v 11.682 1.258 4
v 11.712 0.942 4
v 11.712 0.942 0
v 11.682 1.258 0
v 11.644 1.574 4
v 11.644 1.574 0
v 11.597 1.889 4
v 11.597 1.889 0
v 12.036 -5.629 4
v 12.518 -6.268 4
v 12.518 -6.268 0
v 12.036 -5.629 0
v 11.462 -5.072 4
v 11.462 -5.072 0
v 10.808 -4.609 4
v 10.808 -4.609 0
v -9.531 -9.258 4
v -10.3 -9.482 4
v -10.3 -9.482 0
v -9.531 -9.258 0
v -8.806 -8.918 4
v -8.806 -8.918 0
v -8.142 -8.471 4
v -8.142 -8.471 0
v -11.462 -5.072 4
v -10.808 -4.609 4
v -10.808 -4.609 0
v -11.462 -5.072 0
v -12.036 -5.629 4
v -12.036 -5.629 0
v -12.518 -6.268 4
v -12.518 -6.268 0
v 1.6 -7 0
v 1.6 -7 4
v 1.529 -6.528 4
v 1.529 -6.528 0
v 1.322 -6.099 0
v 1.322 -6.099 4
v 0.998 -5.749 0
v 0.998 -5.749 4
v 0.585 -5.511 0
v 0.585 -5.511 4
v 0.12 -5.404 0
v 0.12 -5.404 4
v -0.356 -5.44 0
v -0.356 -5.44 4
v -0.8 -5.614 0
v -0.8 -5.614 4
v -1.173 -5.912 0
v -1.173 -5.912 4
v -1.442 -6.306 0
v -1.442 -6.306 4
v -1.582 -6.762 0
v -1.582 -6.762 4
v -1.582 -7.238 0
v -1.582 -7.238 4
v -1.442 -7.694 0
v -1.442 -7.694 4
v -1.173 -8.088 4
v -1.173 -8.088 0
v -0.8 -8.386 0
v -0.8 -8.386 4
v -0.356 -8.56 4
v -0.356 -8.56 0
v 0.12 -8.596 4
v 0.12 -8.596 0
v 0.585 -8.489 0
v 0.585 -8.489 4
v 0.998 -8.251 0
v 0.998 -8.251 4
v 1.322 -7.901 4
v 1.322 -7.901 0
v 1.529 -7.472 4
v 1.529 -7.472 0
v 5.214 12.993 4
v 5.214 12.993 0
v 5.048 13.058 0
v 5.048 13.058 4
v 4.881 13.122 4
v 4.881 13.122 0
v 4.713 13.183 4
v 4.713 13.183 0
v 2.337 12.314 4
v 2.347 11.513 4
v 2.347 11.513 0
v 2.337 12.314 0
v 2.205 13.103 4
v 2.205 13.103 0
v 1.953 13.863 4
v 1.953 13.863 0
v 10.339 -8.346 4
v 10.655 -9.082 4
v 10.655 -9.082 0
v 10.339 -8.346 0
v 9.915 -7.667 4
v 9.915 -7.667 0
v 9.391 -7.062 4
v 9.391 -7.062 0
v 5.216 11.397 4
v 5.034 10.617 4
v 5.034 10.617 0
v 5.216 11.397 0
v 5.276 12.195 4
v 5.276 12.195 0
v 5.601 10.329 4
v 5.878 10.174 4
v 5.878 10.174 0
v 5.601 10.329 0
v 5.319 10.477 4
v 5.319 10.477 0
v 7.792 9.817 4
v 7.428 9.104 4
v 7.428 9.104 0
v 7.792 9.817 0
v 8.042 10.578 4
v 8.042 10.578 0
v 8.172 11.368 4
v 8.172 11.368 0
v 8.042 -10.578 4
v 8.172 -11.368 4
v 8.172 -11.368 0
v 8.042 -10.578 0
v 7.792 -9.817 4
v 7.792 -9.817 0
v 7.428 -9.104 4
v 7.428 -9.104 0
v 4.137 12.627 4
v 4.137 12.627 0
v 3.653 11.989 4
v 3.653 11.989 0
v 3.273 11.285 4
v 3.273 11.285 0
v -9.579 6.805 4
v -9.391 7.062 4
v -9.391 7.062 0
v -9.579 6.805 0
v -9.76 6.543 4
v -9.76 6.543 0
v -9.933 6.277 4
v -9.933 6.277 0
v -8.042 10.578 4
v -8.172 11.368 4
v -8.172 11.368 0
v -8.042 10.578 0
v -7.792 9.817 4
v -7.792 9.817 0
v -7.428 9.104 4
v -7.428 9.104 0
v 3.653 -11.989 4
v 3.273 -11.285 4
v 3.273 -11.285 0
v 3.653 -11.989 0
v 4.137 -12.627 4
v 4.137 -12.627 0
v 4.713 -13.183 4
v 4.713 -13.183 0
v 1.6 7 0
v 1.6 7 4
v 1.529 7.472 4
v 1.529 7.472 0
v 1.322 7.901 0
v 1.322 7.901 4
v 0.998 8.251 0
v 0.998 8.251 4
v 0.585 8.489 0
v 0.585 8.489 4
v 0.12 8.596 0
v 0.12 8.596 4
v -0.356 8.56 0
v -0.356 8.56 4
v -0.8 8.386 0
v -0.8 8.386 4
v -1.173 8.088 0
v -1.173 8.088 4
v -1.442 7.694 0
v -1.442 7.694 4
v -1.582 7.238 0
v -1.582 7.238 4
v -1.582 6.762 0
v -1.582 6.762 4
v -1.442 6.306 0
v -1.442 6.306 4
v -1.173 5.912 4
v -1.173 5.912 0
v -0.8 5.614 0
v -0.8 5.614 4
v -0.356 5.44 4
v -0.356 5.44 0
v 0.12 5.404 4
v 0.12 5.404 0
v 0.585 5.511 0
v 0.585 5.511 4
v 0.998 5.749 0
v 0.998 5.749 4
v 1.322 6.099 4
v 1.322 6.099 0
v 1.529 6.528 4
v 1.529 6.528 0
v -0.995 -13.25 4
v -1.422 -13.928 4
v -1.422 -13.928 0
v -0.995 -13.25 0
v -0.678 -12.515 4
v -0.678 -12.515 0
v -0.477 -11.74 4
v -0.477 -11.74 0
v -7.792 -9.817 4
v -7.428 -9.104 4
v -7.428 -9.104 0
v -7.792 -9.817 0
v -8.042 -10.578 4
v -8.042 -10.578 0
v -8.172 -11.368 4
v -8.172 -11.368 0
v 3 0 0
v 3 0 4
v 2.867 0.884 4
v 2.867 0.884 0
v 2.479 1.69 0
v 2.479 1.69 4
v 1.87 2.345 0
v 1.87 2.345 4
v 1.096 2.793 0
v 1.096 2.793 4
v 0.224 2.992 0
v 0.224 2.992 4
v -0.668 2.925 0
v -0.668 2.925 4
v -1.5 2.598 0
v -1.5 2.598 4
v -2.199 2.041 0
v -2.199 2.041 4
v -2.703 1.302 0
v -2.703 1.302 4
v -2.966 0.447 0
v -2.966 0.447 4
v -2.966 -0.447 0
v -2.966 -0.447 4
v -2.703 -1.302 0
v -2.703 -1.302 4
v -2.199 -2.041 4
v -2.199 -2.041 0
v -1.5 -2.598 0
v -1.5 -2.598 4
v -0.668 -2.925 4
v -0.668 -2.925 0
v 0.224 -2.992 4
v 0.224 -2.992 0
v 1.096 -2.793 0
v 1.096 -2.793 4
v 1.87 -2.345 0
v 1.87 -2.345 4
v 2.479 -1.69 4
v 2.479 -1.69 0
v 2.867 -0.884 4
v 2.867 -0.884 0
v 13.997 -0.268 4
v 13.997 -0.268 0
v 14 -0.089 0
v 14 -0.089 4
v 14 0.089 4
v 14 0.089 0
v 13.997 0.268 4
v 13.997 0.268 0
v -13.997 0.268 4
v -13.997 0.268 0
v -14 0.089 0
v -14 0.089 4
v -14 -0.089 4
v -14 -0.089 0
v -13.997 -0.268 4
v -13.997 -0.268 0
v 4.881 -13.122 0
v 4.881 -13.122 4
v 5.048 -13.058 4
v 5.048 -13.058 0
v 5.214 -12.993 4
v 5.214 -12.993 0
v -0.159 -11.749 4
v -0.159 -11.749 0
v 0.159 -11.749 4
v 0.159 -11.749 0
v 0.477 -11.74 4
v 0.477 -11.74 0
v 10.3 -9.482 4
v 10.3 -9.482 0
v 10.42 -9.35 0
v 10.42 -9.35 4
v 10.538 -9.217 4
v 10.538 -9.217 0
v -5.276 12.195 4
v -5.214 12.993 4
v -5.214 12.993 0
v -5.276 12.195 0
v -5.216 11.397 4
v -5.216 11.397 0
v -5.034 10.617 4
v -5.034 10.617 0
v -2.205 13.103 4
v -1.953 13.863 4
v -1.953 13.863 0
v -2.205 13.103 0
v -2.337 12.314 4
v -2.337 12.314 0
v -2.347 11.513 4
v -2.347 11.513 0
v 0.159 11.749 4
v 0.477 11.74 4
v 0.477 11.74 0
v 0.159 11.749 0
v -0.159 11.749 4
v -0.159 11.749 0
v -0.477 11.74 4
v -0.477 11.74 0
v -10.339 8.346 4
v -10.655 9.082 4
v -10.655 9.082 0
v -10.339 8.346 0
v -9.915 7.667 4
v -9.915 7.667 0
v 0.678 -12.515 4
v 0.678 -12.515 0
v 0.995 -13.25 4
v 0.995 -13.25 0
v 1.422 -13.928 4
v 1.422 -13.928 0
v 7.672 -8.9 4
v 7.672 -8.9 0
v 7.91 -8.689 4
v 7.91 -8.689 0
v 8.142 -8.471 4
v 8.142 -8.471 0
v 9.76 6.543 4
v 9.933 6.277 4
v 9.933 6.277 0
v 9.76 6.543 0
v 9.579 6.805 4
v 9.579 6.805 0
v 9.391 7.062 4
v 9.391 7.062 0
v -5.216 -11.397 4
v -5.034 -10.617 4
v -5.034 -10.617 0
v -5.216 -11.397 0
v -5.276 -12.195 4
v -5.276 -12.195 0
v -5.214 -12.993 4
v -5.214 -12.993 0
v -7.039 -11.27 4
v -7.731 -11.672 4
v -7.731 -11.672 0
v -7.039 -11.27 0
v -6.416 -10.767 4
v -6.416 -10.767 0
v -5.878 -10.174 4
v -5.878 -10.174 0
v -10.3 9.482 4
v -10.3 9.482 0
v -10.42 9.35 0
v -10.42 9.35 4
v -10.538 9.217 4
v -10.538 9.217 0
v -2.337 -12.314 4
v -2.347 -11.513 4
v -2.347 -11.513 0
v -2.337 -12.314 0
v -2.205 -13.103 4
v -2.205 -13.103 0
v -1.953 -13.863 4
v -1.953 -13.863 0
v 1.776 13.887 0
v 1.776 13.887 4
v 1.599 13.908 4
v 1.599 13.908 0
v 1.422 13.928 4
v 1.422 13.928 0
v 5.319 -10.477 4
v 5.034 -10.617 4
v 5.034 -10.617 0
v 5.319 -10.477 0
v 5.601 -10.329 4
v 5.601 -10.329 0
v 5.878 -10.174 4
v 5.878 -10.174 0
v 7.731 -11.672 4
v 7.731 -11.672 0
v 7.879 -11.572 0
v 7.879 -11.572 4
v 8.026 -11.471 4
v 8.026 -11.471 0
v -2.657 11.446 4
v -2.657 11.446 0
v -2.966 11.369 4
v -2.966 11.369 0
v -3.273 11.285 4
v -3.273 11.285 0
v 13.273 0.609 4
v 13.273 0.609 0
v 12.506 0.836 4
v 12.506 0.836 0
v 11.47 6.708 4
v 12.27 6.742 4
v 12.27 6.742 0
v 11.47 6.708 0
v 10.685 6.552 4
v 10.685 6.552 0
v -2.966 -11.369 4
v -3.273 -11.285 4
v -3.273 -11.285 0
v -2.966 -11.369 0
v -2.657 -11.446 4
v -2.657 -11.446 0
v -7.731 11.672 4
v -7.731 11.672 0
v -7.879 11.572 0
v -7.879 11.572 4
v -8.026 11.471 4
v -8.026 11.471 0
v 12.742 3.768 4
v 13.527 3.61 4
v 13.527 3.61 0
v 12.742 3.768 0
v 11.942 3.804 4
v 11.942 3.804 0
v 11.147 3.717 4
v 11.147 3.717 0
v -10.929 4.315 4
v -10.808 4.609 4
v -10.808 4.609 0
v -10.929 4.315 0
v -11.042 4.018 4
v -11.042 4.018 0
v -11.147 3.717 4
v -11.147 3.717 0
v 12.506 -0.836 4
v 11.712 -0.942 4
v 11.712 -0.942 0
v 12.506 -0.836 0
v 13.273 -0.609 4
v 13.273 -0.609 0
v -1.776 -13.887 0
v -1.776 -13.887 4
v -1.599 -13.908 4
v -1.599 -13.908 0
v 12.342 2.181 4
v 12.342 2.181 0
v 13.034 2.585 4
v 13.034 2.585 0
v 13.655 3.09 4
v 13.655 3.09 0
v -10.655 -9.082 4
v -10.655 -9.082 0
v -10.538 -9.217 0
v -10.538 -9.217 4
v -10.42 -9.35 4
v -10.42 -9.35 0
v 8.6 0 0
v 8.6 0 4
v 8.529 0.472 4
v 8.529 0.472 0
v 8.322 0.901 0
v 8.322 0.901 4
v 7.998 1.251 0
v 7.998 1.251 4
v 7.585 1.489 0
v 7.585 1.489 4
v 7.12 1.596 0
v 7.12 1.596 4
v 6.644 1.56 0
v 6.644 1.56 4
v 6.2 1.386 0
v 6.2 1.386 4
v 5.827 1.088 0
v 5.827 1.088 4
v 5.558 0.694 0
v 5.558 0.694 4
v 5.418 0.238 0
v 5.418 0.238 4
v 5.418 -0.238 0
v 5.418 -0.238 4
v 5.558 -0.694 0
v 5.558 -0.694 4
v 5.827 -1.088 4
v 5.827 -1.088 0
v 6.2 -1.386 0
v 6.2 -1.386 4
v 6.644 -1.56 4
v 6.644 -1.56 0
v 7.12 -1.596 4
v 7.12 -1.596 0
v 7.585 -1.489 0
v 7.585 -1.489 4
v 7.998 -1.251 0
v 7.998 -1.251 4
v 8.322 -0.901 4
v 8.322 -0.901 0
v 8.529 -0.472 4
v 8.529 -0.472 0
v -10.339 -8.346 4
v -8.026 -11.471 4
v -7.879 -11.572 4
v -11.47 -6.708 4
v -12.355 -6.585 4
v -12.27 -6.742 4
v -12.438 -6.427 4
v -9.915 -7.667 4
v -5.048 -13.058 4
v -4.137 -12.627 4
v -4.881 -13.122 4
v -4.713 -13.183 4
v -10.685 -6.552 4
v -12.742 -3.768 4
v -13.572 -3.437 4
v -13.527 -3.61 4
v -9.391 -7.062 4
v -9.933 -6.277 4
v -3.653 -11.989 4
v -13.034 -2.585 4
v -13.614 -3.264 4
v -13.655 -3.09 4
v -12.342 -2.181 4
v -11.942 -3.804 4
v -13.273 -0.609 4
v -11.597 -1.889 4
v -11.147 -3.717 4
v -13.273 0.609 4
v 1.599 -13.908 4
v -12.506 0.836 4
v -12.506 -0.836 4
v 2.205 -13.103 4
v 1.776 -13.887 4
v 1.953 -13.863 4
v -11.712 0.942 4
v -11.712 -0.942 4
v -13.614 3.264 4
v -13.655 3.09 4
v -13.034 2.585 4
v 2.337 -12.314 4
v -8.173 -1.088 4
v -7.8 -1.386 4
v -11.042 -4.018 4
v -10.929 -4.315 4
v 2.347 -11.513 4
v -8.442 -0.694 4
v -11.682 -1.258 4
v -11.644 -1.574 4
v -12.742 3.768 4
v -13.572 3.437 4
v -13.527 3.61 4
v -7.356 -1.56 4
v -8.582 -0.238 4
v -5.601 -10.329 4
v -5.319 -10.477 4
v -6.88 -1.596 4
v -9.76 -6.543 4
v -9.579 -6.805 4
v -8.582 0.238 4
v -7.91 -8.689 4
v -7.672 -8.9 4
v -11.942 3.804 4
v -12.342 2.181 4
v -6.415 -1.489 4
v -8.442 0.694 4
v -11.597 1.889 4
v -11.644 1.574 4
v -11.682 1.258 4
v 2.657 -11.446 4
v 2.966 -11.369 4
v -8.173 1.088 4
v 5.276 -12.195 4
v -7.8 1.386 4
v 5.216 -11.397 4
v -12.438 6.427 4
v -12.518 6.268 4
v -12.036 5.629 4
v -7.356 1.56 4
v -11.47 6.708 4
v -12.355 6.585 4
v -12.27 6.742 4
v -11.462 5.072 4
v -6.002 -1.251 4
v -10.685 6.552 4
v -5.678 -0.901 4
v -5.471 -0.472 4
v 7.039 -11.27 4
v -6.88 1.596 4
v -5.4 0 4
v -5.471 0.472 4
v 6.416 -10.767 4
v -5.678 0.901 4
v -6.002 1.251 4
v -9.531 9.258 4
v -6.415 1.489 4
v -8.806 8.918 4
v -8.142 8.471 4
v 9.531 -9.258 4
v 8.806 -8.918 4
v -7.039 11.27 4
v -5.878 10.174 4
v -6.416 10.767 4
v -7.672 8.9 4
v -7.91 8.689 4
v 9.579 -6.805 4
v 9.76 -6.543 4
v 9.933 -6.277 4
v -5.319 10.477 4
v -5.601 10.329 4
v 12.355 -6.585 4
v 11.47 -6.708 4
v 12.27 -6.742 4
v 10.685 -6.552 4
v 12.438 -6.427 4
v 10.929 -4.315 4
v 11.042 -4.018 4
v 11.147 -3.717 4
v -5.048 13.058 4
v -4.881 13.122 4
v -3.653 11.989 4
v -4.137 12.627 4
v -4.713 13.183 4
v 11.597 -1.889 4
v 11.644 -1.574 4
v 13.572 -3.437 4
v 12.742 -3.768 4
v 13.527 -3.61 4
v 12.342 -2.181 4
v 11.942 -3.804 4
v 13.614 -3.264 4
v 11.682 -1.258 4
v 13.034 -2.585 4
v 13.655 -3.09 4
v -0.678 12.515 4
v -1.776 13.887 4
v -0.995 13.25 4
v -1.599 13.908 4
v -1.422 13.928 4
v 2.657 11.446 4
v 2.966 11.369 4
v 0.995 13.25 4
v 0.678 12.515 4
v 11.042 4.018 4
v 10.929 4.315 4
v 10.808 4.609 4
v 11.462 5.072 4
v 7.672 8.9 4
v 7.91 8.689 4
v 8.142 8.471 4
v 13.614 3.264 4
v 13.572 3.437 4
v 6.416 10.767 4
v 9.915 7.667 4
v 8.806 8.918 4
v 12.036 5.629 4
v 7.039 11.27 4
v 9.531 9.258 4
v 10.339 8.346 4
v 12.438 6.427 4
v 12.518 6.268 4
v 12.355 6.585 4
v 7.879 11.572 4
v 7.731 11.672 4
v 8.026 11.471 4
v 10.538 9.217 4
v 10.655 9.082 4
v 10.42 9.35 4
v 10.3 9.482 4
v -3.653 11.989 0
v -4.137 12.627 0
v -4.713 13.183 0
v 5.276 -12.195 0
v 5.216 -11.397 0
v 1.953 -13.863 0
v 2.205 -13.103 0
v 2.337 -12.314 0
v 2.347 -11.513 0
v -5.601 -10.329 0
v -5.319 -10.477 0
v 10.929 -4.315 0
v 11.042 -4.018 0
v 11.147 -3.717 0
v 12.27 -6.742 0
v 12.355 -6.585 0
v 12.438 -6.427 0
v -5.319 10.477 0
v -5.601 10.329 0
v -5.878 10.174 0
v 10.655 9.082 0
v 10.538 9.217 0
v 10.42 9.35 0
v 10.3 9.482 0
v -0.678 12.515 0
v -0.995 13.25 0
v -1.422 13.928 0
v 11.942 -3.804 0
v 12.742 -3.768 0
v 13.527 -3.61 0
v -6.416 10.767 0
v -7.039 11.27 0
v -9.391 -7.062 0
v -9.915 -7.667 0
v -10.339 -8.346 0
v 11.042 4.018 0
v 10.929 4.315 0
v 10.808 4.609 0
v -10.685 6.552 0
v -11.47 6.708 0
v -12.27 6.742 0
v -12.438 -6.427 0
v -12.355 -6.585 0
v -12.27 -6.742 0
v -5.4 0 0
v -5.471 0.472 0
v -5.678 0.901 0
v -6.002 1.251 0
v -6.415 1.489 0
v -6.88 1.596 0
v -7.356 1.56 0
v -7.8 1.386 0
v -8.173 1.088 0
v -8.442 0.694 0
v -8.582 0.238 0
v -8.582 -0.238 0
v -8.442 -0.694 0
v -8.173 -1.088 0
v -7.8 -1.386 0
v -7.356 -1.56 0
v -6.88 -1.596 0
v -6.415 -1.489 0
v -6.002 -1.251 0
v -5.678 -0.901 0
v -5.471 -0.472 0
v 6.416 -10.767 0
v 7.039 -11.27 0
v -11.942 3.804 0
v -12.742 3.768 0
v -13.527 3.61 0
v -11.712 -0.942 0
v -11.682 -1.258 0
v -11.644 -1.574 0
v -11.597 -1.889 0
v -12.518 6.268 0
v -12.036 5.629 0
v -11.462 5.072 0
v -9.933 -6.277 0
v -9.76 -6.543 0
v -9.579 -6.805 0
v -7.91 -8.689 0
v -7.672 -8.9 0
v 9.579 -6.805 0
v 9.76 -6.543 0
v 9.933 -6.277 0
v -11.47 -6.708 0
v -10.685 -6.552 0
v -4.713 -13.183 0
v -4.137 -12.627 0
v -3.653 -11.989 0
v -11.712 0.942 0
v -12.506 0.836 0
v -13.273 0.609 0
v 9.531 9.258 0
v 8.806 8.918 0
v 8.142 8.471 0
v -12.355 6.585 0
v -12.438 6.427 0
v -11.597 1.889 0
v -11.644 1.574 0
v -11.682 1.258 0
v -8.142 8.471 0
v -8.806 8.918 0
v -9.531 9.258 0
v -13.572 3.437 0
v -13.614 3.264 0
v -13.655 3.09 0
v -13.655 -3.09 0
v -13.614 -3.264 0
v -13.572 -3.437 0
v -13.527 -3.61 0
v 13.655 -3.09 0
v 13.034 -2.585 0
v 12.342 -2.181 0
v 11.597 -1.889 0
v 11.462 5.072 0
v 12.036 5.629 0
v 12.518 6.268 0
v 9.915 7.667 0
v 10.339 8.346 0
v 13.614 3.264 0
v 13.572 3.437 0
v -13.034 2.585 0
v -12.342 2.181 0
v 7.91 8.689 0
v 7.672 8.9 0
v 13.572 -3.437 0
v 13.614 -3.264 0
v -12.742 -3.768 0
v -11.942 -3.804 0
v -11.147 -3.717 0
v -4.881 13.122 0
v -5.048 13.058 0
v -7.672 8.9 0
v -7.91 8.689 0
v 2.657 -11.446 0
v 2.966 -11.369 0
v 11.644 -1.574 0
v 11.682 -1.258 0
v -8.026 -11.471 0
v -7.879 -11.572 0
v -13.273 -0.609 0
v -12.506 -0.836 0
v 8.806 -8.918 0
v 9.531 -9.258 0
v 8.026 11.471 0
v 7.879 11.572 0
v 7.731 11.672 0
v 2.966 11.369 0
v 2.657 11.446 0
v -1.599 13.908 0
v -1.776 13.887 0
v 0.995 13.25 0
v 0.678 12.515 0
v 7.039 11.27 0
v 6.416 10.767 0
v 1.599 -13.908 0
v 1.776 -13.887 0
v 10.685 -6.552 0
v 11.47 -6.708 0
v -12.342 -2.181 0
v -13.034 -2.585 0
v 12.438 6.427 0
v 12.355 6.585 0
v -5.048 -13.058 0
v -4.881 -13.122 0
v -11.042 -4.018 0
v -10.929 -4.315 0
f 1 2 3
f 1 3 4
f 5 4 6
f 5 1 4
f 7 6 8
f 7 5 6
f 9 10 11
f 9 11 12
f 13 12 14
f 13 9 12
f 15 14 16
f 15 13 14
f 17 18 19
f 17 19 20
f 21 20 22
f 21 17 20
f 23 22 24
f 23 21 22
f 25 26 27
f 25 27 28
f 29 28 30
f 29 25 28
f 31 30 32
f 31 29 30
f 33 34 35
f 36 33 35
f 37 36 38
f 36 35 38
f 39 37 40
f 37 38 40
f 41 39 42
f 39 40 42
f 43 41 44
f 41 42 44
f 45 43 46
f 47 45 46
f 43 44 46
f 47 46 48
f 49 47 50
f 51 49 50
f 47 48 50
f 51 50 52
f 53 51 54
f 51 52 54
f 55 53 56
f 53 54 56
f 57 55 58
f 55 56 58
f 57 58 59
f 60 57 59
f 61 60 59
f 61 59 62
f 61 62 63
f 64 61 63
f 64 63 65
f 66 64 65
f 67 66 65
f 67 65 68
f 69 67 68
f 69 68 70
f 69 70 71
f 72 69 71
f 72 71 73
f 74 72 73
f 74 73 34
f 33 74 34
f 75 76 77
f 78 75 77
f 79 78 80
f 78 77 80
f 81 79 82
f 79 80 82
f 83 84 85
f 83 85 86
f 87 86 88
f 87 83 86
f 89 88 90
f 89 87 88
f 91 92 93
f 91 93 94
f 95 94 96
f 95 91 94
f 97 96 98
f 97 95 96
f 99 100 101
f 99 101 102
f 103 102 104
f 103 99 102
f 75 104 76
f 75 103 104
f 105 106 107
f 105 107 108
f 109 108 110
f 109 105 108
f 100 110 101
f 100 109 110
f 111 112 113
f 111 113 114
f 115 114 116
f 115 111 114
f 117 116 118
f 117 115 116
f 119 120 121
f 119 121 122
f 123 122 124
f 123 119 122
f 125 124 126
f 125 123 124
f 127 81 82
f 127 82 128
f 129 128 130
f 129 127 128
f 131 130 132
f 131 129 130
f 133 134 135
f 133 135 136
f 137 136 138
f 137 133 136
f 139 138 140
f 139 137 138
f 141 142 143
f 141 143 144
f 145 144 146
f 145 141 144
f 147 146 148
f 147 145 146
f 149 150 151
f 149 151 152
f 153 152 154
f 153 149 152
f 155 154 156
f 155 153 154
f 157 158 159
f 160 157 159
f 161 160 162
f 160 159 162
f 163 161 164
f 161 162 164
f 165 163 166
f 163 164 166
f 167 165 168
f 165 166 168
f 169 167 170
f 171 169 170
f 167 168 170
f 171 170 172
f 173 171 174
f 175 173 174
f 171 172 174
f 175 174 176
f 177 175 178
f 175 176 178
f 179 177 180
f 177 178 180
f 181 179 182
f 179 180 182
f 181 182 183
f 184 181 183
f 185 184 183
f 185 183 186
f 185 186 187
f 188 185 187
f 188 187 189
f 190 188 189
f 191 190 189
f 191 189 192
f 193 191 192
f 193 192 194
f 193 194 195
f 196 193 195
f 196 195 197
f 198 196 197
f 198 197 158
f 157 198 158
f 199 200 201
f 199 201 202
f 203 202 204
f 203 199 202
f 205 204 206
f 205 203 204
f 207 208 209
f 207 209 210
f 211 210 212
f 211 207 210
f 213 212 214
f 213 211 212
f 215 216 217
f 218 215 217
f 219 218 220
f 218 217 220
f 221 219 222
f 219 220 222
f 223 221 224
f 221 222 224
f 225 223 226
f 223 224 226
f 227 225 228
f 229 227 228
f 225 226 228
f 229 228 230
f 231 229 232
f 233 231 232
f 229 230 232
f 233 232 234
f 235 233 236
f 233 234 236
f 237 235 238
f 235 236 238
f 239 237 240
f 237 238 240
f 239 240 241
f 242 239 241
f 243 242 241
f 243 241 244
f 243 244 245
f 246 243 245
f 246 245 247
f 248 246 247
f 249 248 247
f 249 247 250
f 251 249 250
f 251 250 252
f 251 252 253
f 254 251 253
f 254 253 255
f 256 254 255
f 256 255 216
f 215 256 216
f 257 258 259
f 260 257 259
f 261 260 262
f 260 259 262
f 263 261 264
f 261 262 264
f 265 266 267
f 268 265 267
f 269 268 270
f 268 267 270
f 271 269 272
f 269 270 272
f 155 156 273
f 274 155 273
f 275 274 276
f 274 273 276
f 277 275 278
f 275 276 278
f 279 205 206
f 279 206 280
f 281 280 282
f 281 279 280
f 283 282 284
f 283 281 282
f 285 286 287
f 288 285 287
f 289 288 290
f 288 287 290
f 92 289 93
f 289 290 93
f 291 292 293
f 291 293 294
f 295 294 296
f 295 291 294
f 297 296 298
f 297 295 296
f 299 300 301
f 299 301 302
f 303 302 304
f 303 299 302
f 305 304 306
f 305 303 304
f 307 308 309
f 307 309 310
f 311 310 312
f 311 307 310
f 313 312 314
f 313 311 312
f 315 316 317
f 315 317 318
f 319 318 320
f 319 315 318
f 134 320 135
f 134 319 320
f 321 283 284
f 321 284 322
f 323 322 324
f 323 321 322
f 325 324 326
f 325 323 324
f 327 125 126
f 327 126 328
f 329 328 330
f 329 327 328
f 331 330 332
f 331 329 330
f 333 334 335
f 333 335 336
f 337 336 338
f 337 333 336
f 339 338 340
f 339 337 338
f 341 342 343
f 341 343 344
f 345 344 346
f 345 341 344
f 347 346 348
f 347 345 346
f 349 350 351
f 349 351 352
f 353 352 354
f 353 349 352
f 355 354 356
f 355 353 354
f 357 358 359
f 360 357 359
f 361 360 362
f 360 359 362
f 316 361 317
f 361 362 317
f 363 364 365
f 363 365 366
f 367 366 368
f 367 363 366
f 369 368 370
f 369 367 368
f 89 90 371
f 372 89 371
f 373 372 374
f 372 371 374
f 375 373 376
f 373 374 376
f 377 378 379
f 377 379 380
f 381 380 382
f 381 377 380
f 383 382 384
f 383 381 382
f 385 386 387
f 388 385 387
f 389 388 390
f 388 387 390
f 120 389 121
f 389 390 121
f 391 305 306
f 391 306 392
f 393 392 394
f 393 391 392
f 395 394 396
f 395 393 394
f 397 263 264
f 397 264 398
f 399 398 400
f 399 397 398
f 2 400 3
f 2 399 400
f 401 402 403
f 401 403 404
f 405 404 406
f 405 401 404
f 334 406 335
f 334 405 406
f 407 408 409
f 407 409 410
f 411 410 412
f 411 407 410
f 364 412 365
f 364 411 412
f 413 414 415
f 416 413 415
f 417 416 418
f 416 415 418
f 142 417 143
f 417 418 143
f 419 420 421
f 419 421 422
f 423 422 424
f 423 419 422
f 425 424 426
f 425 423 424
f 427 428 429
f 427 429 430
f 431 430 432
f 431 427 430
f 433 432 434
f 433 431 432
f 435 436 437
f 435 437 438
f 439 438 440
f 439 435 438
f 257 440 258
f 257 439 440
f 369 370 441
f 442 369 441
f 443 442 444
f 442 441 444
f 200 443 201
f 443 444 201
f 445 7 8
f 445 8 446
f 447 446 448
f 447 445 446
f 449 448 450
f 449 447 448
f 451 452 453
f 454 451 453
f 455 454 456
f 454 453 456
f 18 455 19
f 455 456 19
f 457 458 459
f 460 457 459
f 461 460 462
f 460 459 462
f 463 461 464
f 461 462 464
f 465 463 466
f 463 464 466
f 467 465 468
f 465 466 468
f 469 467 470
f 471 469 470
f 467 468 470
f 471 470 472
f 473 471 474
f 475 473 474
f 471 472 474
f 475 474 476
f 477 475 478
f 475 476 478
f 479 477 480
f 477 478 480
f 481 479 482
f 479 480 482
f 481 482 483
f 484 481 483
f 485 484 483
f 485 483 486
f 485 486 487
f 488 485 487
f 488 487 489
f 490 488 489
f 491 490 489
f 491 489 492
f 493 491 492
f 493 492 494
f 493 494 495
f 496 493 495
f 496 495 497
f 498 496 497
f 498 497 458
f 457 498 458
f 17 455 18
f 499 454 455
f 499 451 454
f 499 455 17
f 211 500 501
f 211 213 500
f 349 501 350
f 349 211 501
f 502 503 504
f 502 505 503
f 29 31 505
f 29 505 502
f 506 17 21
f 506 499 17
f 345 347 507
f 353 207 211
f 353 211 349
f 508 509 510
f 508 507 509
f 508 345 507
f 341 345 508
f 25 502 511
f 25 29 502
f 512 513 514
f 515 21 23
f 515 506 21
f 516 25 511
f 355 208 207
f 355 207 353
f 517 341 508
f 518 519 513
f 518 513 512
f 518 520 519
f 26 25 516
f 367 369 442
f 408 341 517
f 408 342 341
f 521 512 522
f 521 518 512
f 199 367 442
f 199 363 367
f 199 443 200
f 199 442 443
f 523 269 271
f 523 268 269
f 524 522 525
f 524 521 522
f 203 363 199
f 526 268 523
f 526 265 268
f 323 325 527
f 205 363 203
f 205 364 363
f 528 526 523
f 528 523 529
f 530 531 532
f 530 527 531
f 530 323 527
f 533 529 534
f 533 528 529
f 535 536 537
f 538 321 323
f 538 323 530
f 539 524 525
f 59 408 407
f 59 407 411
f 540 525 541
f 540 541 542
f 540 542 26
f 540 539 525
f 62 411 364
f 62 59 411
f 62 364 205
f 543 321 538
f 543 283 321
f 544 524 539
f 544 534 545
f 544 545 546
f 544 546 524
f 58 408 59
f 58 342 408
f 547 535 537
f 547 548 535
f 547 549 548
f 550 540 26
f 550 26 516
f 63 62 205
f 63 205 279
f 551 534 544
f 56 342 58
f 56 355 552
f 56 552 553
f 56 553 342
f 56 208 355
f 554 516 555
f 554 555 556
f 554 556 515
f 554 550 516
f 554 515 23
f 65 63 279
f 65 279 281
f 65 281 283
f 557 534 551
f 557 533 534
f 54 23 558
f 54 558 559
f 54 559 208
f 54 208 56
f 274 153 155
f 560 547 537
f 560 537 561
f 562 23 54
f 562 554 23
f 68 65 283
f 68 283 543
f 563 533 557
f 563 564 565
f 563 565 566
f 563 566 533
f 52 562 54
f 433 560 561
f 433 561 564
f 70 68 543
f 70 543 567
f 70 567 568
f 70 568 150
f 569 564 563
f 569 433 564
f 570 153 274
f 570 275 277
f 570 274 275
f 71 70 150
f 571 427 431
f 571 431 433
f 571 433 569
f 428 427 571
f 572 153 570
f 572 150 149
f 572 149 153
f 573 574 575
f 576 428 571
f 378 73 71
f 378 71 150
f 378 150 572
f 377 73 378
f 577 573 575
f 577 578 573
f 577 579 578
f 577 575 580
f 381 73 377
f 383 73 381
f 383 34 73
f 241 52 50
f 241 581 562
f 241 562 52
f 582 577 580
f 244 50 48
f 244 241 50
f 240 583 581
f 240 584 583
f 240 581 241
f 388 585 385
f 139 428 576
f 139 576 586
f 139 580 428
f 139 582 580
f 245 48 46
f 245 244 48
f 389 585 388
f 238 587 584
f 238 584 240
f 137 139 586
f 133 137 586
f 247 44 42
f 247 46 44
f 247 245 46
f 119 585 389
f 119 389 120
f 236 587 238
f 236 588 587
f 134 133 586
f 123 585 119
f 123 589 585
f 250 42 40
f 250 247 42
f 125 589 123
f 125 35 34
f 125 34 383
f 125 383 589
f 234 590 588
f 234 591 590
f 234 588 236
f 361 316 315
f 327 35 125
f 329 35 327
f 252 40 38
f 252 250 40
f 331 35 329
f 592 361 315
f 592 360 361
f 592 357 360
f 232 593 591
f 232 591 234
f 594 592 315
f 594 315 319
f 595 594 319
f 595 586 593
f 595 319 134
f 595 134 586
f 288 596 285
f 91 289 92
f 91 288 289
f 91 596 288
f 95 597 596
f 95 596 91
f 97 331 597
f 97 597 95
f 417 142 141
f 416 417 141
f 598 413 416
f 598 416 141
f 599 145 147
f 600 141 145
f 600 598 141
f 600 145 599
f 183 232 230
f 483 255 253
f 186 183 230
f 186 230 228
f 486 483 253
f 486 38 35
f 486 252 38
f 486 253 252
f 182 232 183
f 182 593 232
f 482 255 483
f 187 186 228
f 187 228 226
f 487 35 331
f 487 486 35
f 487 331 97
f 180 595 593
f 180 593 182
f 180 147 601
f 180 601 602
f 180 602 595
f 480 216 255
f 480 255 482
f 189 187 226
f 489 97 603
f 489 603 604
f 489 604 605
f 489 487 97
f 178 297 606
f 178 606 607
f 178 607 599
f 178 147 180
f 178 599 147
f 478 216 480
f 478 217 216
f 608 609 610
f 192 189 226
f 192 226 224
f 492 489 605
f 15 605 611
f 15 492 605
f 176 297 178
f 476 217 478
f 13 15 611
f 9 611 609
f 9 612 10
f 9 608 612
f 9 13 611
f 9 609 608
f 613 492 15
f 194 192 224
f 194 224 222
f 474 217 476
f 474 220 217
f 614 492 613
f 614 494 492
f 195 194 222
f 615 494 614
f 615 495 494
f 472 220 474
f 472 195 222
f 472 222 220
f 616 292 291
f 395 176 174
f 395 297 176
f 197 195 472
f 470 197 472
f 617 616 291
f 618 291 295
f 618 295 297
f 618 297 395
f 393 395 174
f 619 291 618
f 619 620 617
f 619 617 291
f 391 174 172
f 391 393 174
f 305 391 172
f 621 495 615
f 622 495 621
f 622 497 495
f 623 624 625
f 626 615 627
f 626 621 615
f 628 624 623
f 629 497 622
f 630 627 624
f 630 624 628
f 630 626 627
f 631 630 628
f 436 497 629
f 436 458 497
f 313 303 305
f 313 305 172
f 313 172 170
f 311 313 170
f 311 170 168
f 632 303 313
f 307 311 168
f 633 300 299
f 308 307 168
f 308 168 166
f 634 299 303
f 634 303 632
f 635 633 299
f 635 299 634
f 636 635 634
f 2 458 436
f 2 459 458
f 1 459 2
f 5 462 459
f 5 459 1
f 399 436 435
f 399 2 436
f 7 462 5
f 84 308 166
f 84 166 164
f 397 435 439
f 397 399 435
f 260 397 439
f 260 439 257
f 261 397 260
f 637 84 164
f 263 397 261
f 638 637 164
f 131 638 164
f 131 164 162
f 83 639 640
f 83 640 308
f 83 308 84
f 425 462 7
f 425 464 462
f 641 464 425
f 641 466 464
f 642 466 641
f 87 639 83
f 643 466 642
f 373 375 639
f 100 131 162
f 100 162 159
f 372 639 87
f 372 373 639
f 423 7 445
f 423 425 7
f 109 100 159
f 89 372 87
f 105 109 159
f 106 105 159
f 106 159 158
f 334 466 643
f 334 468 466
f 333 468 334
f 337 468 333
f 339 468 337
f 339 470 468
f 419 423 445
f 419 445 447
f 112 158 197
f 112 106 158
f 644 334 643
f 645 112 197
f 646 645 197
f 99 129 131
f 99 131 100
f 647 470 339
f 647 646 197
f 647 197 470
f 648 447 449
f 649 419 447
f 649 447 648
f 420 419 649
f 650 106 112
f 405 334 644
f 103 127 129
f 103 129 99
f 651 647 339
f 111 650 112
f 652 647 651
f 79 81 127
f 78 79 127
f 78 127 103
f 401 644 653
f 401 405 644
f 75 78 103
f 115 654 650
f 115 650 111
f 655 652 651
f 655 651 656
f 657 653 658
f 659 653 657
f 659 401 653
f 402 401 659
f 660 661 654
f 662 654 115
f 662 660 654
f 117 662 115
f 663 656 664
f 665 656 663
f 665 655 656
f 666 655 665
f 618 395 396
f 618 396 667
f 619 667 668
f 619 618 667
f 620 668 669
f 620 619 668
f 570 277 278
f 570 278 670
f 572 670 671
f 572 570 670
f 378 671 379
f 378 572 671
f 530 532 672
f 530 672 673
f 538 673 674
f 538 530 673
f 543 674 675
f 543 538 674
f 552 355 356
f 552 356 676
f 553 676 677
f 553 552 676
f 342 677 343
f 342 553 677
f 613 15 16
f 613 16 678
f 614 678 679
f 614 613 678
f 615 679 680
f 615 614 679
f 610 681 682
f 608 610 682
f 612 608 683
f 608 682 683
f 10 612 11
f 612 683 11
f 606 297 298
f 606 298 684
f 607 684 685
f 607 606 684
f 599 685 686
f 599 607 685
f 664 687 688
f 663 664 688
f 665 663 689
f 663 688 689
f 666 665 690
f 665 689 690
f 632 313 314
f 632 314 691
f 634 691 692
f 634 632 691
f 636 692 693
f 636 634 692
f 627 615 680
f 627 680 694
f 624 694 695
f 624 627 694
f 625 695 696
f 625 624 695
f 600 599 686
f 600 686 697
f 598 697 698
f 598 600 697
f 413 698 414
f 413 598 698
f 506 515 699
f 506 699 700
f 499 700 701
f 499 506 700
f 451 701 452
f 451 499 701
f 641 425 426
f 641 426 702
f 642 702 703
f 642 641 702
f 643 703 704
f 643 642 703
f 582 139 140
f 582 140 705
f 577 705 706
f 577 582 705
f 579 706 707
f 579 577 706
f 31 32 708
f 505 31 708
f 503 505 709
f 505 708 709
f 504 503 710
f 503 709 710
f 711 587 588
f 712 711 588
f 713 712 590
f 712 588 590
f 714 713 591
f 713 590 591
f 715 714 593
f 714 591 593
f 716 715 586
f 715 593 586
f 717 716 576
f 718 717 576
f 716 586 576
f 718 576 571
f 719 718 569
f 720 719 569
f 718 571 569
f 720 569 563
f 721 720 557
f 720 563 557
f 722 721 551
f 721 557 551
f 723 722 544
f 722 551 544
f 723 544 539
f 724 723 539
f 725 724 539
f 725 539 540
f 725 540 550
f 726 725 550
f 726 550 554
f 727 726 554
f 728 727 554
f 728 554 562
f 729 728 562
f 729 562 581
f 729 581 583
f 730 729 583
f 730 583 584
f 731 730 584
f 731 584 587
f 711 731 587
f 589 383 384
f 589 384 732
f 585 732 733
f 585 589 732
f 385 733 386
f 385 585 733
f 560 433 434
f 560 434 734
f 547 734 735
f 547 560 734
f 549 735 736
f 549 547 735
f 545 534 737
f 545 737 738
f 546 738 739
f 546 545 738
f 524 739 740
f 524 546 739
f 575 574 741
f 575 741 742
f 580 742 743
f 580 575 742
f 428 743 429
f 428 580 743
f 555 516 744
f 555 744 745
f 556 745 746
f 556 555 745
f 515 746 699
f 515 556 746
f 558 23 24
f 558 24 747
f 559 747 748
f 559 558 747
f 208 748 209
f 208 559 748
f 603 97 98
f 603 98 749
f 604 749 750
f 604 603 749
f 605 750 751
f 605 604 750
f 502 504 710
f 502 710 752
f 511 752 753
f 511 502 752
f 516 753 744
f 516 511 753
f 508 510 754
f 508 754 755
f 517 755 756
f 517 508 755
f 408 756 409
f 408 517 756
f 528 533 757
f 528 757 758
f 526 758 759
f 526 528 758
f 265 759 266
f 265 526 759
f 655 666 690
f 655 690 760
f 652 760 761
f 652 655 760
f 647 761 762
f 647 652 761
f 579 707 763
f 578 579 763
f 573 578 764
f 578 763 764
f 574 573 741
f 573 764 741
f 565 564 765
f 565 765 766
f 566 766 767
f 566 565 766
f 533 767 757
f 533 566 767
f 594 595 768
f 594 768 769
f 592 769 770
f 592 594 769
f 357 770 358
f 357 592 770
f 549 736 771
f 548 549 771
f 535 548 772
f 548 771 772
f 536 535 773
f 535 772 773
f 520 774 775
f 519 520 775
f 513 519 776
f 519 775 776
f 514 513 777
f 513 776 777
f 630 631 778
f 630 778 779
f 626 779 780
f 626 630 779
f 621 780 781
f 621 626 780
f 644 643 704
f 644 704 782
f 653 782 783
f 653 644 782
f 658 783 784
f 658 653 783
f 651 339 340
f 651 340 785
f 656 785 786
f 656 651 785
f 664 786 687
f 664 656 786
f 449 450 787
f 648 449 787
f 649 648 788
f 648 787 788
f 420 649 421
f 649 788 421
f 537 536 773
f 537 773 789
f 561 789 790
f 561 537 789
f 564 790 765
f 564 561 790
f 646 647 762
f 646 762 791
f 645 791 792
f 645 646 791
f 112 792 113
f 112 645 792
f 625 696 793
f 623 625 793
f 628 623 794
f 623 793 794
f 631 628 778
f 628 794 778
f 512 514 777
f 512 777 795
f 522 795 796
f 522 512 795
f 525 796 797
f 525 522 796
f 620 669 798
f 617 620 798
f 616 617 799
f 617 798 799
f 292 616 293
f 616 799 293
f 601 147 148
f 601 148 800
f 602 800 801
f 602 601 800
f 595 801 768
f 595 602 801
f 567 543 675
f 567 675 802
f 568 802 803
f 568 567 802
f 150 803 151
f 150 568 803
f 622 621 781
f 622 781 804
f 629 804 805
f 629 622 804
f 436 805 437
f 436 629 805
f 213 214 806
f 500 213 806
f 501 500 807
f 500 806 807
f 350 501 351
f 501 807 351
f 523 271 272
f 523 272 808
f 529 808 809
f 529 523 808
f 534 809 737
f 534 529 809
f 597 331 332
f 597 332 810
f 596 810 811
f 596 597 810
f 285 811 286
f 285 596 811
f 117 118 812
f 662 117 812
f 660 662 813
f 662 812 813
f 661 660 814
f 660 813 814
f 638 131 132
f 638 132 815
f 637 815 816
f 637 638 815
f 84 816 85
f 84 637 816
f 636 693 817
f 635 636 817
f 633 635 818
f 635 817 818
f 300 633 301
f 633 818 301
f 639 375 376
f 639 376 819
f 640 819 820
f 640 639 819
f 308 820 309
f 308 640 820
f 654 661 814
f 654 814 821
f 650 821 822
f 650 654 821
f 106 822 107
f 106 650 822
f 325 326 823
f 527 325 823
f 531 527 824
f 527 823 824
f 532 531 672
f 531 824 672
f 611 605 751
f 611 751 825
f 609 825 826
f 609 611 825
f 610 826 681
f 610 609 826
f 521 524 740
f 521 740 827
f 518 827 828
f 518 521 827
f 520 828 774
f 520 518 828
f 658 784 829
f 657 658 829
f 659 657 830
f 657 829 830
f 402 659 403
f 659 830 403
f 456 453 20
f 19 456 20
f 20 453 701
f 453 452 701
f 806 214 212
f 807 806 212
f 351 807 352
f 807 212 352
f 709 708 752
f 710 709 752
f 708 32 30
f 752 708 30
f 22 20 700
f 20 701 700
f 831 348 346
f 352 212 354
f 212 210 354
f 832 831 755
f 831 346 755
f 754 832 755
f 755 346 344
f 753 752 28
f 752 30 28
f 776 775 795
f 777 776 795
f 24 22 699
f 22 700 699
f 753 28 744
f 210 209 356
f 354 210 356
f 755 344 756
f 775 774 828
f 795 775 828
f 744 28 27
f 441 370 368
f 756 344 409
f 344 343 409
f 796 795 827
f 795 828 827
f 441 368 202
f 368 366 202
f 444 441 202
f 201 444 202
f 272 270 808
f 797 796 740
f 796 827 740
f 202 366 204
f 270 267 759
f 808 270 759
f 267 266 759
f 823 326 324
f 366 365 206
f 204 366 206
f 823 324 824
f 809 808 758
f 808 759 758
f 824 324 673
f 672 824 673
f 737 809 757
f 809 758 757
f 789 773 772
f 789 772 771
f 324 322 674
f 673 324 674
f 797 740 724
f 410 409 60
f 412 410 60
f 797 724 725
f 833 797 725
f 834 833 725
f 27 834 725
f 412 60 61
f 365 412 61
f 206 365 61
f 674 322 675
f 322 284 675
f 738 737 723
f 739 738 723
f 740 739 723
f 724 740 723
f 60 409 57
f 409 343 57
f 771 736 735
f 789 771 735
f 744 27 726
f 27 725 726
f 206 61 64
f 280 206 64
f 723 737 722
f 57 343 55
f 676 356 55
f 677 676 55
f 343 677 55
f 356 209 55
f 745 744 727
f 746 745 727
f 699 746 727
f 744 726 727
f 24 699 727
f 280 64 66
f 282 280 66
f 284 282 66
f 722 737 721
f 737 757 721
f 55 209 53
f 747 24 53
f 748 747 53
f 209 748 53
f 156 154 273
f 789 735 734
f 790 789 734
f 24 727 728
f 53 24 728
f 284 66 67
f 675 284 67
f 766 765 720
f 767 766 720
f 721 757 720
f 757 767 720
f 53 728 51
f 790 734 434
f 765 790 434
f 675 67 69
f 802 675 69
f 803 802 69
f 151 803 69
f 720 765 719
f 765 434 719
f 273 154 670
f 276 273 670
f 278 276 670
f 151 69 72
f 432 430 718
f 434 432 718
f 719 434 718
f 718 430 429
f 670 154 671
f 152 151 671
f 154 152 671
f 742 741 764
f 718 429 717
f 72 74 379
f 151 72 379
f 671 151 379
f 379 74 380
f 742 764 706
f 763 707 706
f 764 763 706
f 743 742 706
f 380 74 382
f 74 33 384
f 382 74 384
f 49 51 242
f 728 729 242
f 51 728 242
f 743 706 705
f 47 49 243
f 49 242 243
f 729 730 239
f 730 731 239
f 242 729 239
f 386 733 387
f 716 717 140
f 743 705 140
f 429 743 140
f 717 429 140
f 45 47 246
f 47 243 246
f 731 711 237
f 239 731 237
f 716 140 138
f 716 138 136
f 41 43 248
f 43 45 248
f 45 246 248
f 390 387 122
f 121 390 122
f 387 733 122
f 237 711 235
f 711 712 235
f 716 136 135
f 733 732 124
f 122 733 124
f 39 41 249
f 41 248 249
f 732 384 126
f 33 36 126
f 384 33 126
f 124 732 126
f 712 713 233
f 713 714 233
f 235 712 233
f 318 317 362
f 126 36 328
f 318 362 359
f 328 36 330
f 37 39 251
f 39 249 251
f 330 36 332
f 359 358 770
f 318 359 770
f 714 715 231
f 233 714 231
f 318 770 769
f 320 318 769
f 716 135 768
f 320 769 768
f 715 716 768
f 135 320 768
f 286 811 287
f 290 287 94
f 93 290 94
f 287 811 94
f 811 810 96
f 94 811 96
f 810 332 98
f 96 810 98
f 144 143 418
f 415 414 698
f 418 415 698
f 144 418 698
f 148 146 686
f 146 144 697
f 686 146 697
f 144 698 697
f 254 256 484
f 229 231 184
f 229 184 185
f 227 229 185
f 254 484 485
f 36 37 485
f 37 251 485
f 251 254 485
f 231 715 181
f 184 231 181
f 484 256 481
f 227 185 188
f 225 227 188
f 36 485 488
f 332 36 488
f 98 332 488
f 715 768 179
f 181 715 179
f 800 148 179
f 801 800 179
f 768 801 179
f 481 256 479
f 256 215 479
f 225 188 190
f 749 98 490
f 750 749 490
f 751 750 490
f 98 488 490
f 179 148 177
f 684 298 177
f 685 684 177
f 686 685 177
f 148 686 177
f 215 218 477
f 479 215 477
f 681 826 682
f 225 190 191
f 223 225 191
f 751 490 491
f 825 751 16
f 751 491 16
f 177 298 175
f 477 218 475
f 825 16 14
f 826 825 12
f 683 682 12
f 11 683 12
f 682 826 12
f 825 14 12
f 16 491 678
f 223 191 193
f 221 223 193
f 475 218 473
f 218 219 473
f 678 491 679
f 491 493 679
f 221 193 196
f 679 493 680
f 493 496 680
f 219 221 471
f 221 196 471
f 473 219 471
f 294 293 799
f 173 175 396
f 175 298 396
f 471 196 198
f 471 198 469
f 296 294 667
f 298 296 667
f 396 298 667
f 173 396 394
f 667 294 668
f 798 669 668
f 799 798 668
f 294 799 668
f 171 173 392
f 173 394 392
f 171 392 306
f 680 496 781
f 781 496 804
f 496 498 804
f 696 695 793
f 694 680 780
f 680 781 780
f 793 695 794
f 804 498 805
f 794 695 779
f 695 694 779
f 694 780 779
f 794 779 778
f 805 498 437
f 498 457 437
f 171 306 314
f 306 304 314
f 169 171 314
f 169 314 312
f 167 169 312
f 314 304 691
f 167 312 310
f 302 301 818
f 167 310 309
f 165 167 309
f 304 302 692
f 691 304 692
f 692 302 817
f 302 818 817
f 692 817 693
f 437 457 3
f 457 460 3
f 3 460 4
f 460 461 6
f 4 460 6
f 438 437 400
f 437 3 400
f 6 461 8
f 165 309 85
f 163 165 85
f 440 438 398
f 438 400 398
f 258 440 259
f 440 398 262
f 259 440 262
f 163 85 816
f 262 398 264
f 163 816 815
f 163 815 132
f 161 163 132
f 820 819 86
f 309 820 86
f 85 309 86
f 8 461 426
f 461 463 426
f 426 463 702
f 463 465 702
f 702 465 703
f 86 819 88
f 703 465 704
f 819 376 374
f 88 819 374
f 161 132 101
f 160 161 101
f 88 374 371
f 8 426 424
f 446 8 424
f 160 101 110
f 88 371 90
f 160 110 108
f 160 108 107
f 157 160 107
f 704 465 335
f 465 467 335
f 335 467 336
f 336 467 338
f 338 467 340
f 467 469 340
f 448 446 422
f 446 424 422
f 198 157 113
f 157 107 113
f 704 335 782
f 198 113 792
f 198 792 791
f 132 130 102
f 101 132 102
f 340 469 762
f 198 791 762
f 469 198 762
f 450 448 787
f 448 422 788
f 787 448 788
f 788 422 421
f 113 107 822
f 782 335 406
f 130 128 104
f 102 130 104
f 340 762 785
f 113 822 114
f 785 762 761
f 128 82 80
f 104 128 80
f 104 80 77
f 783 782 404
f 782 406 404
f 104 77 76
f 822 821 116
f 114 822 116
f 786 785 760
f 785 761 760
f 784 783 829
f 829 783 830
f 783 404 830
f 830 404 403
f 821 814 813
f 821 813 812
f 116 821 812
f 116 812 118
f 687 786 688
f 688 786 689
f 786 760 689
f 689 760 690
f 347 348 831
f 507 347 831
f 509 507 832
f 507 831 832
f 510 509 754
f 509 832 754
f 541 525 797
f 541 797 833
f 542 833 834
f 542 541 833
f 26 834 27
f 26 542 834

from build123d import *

# Parameters (mm, degrees)
SKETCH_1_R               = 14
EXTRUDE_1_DEPTH          = 4
CUT_EXTRUDE_1_DEPTH      = 4
PATTERN_CIRCULAR_1_COUNT = 26
CUT_EXTRUDE_2_REACH      = 6
SKETCH_3_R               = 3
SKETCH_3_R_2             = 1.6


with BuildPart() as part:
    # 草圖1 → 填料-伸長1 (new body)
    with BuildSketch(Plane.XY):
        Circle(SKETCH_1_R)
    extrude(amount=EXTRUDE_1_DEPTH)

    # 草圖2 → 除料-伸長1 (cut)
    with BuildSketch(Plane.XY.offset(4)):
        with BuildLine():
            ThreePointArc((-1.421594657, 13.927636865), (0, 14), (1.421594657, 13.927636865))
            ThreePointArc((1.421594657, 13.927636865), (0.822322703, 12.888806427), (0.476978653, 11.74031479))
            ThreePointArc((0.476978653, 11.74031479), (0, 11.75), (-0.476978653, 11.74031479))
            ThreePointArc((-0.476978653, 11.74031479), (-0.822322703, 12.888806427), (-1.421594657, 13.927636865))
        make_face()
    cut_extrude_1 = extrude(amount=-CUT_EXTRUDE_1_DEPTH, mode=Mode.SUBTRACT)

    # 環狀複製排列1: 除料-伸長1 ×26 about axis
    pattern_circular_1_axis = Axis((0, 0, 0), (0, 0, 1))
    for i in range(1, PATTERN_CIRCULAR_1_COUNT):
        add(cut_extrude_1.rotate(pattern_circular_1_axis, i * 360 / PATTERN_CIRCULAR_1_COUNT), mode=Mode.SUBTRACT)

    # 草圖3 → 除料-伸長2 (cut, up to next)
    with BuildSketch(Plane.XY.offset(4), mode=Mode.PRIVATE) as cut_extrude_2_sk1:
        Circle(SKETCH_3_R)
    cut_extrude_2_tool1 = extrude(cut_extrude_2_sk1.sketch, amount=-CUT_EXTRUDE_2_REACH, mode=Mode.PRIVATE) & part.part
    add(cut_extrude_2_tool1.solids().sort_by_distance((0, 0, 4))[0], mode=Mode.SUBTRACT)
    # 草圖3 → 除料-伸長2 (cut, up to next)
    with BuildSketch(Plane.XY.offset(4), mode=Mode.PRIVATE) as cut_extrude_2_sk2:
        with Locations((0, 7)):
            Circle(SKETCH_3_R_2)
    cut_extrude_2_tool2 = extrude(cut_extrude_2_sk2.sketch, amount=-CUT_EXTRUDE_2_REACH, mode=Mode.PRIVATE) & part.part
    add(cut_extrude_2_tool2.solids().sort_by_distance((0, 7, 4))[0], mode=Mode.SUBTRACT)
    # 草圖3 → 除料-伸長2 (cut, up to next)
    with BuildSketch(Plane.XY.offset(4), mode=Mode.PRIVATE) as cut_extrude_2_sk3:
        with Locations((7, 0)):
            Circle(SKETCH_3_R_2)
    cut_extrude_2_tool3 = extrude(cut_extrude_2_sk3.sketch, amount=-CUT_EXTRUDE_2_REACH, mode=Mode.PRIVATE) & part.part
    add(cut_extrude_2_tool3.solids().sort_by_distance((7, 0, 4))[0], mode=Mode.SUBTRACT)
    # 草圖3 → 除料-伸長2 (cut, up to next)
    with BuildSketch(Plane.XY.offset(4), mode=Mode.PRIVATE) as cut_extrude_2_sk4:
        with Locations((0, -7)):
            Circle(SKETCH_3_R_2)
    cut_extrude_2_tool4 = extrude(cut_extrude_2_sk4.sketch, amount=-CUT_EXTRUDE_2_REACH, mode=Mode.PRIVATE) & part.part
    add(cut_extrude_2_tool4.solids().sort_by_distance((0, -7, 4))[0], mode=Mode.SUBTRACT)
    # 草圖3 → 除料-伸長2 (cut, up to next)
    with BuildSketch(Plane.XY.offset(4), mode=Mode.PRIVATE) as cut_extrude_2_sk5:
        with Locations((-7, 0)):
            Circle(SKETCH_3_R_2)
    cut_extrude_2_tool5 = extrude(cut_extrude_2_sk5.sketch, amount=-CUT_EXTRUDE_2_REACH, mode=Mode.PRIVATE) & part.part
    add(cut_extrude_2_tool5.solids().sort_by_distance((-7, 0, 4))[0], mode=Mode.SUBTRACT)


solid = part.part
